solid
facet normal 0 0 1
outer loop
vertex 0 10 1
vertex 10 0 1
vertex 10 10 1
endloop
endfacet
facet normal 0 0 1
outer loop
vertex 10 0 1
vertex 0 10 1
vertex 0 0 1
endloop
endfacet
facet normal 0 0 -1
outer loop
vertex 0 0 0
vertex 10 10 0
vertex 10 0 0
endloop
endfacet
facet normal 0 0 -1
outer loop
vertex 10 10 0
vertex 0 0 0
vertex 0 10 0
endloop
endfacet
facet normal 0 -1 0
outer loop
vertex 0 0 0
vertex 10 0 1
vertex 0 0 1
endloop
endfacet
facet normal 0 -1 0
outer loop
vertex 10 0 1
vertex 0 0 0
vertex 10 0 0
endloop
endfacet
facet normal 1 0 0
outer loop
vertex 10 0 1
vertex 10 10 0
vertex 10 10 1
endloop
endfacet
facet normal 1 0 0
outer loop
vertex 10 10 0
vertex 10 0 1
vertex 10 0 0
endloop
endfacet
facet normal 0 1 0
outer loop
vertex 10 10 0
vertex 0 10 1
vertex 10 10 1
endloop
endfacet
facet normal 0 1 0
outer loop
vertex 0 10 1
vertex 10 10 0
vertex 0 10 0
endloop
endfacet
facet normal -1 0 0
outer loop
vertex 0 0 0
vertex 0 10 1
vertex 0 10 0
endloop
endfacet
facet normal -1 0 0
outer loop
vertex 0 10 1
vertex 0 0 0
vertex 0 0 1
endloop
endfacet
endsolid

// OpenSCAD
// expect: doesn't add up in OpenSCAD
heights = [5, 10, 15];
total = 0;
for (h = heights) {
    total = total + h;
}
cube([10, 10, max(total, 1)]);
